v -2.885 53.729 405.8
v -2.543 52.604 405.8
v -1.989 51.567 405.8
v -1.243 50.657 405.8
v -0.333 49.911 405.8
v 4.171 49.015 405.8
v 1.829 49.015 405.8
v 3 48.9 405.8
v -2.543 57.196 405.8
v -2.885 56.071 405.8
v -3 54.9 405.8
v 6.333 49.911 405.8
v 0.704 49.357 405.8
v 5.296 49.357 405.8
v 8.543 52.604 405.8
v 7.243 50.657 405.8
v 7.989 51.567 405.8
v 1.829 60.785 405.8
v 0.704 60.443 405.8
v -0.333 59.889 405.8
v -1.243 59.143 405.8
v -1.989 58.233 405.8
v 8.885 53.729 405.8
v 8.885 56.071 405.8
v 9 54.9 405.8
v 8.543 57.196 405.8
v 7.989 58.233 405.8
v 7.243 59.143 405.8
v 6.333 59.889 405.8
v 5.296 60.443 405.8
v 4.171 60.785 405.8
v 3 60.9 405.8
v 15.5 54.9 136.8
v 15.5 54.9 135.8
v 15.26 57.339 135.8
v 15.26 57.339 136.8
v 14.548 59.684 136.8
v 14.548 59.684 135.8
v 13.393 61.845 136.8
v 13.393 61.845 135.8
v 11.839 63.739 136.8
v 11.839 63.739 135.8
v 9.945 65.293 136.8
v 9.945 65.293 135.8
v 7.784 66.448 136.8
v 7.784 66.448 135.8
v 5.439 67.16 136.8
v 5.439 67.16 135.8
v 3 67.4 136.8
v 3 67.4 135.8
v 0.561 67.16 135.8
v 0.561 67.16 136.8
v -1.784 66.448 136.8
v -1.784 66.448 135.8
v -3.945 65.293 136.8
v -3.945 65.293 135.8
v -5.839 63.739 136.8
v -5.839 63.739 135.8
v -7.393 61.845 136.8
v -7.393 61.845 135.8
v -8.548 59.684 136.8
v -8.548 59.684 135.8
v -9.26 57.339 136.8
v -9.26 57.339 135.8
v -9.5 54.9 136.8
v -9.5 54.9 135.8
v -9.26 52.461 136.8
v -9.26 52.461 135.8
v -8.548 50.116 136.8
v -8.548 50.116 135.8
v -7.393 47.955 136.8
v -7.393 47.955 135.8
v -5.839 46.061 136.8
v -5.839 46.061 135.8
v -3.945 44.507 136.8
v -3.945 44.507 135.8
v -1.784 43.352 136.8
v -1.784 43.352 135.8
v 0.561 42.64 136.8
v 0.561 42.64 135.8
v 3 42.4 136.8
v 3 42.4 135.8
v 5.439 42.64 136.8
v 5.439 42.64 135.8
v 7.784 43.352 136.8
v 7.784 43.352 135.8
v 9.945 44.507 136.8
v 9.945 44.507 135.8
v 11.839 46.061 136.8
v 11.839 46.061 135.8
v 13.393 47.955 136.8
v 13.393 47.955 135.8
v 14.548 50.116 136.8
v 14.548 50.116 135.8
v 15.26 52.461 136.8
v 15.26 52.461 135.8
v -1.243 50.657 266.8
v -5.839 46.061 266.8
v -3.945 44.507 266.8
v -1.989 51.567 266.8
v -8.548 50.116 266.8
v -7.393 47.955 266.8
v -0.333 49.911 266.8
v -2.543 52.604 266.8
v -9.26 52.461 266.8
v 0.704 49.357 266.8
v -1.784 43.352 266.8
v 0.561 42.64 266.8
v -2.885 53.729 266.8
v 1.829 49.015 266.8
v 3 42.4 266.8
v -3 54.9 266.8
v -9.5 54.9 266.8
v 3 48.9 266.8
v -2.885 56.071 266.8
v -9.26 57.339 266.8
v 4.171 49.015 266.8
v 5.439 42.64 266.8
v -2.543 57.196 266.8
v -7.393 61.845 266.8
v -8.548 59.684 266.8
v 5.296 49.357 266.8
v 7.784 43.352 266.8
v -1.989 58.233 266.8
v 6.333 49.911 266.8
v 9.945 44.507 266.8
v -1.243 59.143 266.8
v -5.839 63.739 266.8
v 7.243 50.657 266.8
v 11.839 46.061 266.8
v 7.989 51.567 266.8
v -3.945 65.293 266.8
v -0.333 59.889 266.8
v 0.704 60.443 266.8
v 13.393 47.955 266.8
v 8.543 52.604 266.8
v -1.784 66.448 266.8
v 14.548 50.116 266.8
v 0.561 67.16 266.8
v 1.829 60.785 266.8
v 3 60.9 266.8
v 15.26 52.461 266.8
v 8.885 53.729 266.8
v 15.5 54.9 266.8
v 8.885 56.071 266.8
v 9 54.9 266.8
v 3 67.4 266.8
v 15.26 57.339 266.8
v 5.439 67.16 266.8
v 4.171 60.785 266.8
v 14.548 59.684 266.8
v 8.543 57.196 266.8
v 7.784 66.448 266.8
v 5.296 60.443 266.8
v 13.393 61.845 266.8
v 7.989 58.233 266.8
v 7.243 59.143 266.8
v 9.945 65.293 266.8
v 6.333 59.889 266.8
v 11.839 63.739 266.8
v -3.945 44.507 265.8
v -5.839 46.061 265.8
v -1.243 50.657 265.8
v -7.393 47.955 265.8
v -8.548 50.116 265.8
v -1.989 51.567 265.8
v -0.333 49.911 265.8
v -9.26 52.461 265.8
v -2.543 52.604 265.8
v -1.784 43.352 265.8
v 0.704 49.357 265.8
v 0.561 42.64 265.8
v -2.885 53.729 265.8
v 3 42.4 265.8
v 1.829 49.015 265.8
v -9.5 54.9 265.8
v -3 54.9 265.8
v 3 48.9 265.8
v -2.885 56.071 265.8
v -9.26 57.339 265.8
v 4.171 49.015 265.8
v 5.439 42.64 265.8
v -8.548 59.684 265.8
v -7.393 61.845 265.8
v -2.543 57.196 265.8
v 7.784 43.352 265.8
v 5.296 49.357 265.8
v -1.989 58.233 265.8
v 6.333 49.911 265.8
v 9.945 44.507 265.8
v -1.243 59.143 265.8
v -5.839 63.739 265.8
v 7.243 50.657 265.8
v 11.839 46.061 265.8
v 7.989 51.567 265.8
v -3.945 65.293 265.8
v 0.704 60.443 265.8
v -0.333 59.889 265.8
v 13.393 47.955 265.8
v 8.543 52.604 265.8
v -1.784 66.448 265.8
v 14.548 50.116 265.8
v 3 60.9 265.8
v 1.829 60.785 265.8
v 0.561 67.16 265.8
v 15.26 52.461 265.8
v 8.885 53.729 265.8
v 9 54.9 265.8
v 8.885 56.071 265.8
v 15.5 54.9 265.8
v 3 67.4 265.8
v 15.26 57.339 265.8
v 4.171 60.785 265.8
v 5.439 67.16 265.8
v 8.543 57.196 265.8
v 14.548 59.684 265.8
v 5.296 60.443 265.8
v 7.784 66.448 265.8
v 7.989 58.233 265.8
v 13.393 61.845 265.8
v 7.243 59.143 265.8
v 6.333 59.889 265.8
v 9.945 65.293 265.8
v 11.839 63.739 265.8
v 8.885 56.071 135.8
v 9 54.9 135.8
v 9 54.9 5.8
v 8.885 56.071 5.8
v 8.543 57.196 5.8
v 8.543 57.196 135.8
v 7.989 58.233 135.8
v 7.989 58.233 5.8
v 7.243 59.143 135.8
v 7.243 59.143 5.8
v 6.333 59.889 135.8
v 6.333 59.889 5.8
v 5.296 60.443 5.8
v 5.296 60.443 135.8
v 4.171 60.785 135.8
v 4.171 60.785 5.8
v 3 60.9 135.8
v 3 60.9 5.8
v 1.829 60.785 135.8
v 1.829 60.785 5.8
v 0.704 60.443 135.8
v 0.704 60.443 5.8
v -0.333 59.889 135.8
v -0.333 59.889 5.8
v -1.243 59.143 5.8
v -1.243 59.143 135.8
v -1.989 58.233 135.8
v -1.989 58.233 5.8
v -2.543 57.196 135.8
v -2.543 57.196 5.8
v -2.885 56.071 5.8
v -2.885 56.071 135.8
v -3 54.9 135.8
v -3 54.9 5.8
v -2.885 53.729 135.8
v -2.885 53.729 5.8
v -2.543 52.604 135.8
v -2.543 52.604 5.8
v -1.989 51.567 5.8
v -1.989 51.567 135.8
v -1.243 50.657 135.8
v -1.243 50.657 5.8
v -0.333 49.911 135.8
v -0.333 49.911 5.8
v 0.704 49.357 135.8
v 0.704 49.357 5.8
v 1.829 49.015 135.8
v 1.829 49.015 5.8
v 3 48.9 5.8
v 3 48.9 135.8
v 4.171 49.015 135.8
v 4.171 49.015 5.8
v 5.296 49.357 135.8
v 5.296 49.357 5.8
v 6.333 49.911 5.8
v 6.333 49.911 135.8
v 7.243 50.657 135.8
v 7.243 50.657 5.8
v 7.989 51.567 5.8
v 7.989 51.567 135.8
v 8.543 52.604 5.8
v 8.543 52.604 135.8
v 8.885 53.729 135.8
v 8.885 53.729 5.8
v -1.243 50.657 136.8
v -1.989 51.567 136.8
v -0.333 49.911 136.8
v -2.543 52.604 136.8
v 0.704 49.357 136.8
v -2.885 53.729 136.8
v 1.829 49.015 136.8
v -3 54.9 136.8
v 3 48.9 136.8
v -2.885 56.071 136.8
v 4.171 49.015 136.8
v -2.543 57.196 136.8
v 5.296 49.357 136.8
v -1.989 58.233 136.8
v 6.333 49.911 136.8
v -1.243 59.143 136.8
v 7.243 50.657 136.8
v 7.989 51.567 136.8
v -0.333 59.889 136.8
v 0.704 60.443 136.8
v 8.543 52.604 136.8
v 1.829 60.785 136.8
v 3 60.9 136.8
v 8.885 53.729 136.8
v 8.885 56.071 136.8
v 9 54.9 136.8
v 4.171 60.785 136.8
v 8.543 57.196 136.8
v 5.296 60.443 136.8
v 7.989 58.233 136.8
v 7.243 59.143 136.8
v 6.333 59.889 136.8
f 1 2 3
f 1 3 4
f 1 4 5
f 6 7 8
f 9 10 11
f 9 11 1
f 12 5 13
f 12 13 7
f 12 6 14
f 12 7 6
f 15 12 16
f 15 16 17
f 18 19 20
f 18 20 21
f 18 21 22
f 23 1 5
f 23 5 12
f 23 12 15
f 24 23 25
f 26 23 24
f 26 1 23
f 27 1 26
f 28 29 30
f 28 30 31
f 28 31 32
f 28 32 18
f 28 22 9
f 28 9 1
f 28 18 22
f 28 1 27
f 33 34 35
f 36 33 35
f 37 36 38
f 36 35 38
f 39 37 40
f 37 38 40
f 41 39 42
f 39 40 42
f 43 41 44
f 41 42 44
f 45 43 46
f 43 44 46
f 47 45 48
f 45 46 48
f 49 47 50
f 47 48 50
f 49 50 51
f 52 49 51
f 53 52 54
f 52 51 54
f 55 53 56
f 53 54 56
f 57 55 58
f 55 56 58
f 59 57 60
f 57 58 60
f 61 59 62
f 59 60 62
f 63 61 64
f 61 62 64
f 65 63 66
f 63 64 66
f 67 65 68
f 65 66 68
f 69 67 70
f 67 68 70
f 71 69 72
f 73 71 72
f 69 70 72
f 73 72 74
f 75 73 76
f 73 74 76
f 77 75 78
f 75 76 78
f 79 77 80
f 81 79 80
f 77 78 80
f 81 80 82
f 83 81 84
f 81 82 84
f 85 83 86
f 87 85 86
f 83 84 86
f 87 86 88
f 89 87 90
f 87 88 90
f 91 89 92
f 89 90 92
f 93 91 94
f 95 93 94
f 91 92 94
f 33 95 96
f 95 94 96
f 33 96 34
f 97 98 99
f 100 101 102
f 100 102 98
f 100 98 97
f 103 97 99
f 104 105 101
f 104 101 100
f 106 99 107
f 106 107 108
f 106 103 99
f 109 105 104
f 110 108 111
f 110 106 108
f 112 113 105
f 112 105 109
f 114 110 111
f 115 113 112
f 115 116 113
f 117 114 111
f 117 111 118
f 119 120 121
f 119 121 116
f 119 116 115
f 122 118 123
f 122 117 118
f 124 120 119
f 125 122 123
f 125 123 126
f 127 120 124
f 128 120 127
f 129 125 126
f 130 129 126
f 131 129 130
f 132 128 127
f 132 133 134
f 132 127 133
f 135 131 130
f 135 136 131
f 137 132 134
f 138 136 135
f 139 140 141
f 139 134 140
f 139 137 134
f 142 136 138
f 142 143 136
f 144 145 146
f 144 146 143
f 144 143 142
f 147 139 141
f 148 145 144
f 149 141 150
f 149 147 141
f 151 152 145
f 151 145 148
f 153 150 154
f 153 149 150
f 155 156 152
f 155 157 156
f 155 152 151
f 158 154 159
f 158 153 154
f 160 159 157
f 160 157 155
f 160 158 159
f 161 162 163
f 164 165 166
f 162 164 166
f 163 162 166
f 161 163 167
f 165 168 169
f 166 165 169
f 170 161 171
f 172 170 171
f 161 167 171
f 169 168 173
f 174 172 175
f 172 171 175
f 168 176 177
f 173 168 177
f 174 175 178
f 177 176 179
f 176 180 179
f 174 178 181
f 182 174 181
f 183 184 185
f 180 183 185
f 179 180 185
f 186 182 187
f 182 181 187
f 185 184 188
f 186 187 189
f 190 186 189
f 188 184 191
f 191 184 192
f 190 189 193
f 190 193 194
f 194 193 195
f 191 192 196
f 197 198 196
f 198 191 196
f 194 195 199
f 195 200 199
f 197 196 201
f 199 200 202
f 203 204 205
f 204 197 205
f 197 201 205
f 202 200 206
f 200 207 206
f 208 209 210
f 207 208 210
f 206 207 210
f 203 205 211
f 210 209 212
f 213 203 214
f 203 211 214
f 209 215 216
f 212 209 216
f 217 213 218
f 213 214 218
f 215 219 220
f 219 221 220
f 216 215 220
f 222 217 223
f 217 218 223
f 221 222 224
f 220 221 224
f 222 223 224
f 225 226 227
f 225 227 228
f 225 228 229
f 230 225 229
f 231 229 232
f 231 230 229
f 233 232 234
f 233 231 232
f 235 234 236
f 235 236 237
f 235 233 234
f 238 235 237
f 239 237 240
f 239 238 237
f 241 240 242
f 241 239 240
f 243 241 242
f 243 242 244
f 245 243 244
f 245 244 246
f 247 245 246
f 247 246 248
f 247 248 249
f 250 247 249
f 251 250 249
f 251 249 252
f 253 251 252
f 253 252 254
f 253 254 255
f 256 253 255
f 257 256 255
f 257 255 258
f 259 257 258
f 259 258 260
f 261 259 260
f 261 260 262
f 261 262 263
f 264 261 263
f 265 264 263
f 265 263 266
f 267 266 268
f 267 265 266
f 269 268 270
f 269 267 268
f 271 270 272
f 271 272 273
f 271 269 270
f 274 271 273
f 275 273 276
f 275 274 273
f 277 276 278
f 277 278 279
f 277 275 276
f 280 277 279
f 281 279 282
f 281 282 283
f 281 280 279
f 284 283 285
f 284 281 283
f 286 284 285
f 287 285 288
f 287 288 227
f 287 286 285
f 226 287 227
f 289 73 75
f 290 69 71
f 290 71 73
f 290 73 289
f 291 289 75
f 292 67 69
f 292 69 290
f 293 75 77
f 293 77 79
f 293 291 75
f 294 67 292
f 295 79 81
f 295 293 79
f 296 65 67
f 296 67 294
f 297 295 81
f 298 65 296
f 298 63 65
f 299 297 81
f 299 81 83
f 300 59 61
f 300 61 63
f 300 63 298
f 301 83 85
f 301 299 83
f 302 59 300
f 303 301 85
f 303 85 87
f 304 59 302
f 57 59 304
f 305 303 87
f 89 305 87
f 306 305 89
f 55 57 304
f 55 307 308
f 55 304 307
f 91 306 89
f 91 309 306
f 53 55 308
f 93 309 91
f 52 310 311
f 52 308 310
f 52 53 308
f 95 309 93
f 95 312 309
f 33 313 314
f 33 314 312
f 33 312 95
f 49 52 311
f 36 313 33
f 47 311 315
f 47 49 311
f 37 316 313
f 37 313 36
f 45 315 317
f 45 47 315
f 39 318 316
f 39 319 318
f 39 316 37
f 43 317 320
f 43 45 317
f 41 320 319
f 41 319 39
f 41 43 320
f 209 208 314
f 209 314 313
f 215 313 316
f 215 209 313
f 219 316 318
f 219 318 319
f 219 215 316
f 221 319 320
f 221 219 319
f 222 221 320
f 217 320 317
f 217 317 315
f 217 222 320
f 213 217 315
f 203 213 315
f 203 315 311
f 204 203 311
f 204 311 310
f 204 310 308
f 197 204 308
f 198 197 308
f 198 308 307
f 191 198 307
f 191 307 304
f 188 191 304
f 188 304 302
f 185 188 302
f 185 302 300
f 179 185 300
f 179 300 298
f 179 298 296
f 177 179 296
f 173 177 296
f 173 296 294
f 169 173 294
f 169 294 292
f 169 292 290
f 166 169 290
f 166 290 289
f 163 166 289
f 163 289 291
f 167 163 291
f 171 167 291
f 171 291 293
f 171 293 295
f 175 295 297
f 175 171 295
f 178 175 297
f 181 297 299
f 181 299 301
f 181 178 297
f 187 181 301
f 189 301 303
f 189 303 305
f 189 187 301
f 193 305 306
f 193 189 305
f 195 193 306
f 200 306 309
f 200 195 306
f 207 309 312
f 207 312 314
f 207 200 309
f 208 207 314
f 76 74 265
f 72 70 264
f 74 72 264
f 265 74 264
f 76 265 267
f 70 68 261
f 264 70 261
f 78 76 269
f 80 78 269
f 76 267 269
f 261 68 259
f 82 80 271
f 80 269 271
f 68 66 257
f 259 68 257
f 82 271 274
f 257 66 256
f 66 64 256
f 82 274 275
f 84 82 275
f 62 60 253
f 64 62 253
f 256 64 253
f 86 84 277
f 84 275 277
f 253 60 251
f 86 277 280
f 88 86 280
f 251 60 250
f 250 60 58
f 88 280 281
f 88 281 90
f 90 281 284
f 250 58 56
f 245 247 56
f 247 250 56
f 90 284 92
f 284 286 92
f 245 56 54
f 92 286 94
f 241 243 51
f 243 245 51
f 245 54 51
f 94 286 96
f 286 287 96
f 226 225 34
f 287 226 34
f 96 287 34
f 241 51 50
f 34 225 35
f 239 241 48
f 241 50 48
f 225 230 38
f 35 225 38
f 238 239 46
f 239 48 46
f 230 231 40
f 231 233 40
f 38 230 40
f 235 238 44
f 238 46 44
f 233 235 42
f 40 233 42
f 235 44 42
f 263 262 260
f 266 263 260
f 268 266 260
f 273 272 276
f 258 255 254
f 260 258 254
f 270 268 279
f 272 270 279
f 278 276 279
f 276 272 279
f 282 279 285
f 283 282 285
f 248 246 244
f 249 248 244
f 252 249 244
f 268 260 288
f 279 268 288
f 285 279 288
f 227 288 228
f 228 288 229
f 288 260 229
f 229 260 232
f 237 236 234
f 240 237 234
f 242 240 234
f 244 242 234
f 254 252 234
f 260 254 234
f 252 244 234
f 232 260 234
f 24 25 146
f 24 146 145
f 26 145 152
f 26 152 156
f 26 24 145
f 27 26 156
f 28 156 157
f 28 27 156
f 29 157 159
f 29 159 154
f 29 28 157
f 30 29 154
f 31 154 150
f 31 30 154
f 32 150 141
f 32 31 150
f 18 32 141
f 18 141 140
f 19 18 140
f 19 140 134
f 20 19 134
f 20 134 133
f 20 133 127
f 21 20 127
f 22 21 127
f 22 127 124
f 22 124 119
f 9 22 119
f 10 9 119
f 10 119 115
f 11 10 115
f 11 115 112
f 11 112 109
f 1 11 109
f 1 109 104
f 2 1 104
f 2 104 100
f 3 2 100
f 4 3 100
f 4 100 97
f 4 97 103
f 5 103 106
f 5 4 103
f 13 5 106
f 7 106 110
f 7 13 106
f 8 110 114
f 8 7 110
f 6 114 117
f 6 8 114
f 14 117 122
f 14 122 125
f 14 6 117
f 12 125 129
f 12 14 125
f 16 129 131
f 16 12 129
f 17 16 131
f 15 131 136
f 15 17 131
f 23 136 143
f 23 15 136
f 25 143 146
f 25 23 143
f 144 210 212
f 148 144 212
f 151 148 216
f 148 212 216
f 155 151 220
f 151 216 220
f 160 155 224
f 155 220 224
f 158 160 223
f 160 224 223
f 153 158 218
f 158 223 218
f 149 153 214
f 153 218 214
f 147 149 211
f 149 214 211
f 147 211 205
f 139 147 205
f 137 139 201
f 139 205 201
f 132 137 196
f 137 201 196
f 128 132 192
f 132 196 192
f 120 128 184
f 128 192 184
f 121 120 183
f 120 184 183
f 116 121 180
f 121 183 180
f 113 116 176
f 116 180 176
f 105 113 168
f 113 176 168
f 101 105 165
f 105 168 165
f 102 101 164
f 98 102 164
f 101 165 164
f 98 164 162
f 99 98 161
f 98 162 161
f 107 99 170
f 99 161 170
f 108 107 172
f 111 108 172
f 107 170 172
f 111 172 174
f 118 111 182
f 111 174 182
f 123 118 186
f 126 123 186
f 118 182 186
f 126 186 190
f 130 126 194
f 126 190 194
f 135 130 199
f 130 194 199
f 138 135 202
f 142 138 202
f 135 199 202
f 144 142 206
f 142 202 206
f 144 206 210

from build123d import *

# Parameters (mm, degrees)
SKETCH019_R  = 6
PAD010_DEPTH = 400
SKETCH071_R  = 12.5
PAD_DEPTH    = 1
SKETCH_R     = 12.5
PAD011_DEPTH = 1


with BuildPart() as part:
    # Sketch019 → Pad010 (new body)
    with BuildSketch(Plane.XY):
        Circle(SKETCH019_R)
    extrude(amount=-PAD010_DEPTH)

    # Sketch071 (on Face2 of Pad010) → Pad (join)
    with BuildSketch(Plane.XY.offset(-270)):
        Circle(SKETCH071_R)
    extrude(amount=PAD_DEPTH)

    # Sketch (on Face2 of Pad) → Pad011 (join)
    with BuildSketch(Plane.XY.offset(-140)):
        Circle(SKETCH_R)
    extrude(amount=PAD011_DEPTH)


with BuildPart() as part_1:
    # Body007 placement: moved
    add(part.part.moved(Location((3, 54.9, 405.8))))


solid = part_1.part
